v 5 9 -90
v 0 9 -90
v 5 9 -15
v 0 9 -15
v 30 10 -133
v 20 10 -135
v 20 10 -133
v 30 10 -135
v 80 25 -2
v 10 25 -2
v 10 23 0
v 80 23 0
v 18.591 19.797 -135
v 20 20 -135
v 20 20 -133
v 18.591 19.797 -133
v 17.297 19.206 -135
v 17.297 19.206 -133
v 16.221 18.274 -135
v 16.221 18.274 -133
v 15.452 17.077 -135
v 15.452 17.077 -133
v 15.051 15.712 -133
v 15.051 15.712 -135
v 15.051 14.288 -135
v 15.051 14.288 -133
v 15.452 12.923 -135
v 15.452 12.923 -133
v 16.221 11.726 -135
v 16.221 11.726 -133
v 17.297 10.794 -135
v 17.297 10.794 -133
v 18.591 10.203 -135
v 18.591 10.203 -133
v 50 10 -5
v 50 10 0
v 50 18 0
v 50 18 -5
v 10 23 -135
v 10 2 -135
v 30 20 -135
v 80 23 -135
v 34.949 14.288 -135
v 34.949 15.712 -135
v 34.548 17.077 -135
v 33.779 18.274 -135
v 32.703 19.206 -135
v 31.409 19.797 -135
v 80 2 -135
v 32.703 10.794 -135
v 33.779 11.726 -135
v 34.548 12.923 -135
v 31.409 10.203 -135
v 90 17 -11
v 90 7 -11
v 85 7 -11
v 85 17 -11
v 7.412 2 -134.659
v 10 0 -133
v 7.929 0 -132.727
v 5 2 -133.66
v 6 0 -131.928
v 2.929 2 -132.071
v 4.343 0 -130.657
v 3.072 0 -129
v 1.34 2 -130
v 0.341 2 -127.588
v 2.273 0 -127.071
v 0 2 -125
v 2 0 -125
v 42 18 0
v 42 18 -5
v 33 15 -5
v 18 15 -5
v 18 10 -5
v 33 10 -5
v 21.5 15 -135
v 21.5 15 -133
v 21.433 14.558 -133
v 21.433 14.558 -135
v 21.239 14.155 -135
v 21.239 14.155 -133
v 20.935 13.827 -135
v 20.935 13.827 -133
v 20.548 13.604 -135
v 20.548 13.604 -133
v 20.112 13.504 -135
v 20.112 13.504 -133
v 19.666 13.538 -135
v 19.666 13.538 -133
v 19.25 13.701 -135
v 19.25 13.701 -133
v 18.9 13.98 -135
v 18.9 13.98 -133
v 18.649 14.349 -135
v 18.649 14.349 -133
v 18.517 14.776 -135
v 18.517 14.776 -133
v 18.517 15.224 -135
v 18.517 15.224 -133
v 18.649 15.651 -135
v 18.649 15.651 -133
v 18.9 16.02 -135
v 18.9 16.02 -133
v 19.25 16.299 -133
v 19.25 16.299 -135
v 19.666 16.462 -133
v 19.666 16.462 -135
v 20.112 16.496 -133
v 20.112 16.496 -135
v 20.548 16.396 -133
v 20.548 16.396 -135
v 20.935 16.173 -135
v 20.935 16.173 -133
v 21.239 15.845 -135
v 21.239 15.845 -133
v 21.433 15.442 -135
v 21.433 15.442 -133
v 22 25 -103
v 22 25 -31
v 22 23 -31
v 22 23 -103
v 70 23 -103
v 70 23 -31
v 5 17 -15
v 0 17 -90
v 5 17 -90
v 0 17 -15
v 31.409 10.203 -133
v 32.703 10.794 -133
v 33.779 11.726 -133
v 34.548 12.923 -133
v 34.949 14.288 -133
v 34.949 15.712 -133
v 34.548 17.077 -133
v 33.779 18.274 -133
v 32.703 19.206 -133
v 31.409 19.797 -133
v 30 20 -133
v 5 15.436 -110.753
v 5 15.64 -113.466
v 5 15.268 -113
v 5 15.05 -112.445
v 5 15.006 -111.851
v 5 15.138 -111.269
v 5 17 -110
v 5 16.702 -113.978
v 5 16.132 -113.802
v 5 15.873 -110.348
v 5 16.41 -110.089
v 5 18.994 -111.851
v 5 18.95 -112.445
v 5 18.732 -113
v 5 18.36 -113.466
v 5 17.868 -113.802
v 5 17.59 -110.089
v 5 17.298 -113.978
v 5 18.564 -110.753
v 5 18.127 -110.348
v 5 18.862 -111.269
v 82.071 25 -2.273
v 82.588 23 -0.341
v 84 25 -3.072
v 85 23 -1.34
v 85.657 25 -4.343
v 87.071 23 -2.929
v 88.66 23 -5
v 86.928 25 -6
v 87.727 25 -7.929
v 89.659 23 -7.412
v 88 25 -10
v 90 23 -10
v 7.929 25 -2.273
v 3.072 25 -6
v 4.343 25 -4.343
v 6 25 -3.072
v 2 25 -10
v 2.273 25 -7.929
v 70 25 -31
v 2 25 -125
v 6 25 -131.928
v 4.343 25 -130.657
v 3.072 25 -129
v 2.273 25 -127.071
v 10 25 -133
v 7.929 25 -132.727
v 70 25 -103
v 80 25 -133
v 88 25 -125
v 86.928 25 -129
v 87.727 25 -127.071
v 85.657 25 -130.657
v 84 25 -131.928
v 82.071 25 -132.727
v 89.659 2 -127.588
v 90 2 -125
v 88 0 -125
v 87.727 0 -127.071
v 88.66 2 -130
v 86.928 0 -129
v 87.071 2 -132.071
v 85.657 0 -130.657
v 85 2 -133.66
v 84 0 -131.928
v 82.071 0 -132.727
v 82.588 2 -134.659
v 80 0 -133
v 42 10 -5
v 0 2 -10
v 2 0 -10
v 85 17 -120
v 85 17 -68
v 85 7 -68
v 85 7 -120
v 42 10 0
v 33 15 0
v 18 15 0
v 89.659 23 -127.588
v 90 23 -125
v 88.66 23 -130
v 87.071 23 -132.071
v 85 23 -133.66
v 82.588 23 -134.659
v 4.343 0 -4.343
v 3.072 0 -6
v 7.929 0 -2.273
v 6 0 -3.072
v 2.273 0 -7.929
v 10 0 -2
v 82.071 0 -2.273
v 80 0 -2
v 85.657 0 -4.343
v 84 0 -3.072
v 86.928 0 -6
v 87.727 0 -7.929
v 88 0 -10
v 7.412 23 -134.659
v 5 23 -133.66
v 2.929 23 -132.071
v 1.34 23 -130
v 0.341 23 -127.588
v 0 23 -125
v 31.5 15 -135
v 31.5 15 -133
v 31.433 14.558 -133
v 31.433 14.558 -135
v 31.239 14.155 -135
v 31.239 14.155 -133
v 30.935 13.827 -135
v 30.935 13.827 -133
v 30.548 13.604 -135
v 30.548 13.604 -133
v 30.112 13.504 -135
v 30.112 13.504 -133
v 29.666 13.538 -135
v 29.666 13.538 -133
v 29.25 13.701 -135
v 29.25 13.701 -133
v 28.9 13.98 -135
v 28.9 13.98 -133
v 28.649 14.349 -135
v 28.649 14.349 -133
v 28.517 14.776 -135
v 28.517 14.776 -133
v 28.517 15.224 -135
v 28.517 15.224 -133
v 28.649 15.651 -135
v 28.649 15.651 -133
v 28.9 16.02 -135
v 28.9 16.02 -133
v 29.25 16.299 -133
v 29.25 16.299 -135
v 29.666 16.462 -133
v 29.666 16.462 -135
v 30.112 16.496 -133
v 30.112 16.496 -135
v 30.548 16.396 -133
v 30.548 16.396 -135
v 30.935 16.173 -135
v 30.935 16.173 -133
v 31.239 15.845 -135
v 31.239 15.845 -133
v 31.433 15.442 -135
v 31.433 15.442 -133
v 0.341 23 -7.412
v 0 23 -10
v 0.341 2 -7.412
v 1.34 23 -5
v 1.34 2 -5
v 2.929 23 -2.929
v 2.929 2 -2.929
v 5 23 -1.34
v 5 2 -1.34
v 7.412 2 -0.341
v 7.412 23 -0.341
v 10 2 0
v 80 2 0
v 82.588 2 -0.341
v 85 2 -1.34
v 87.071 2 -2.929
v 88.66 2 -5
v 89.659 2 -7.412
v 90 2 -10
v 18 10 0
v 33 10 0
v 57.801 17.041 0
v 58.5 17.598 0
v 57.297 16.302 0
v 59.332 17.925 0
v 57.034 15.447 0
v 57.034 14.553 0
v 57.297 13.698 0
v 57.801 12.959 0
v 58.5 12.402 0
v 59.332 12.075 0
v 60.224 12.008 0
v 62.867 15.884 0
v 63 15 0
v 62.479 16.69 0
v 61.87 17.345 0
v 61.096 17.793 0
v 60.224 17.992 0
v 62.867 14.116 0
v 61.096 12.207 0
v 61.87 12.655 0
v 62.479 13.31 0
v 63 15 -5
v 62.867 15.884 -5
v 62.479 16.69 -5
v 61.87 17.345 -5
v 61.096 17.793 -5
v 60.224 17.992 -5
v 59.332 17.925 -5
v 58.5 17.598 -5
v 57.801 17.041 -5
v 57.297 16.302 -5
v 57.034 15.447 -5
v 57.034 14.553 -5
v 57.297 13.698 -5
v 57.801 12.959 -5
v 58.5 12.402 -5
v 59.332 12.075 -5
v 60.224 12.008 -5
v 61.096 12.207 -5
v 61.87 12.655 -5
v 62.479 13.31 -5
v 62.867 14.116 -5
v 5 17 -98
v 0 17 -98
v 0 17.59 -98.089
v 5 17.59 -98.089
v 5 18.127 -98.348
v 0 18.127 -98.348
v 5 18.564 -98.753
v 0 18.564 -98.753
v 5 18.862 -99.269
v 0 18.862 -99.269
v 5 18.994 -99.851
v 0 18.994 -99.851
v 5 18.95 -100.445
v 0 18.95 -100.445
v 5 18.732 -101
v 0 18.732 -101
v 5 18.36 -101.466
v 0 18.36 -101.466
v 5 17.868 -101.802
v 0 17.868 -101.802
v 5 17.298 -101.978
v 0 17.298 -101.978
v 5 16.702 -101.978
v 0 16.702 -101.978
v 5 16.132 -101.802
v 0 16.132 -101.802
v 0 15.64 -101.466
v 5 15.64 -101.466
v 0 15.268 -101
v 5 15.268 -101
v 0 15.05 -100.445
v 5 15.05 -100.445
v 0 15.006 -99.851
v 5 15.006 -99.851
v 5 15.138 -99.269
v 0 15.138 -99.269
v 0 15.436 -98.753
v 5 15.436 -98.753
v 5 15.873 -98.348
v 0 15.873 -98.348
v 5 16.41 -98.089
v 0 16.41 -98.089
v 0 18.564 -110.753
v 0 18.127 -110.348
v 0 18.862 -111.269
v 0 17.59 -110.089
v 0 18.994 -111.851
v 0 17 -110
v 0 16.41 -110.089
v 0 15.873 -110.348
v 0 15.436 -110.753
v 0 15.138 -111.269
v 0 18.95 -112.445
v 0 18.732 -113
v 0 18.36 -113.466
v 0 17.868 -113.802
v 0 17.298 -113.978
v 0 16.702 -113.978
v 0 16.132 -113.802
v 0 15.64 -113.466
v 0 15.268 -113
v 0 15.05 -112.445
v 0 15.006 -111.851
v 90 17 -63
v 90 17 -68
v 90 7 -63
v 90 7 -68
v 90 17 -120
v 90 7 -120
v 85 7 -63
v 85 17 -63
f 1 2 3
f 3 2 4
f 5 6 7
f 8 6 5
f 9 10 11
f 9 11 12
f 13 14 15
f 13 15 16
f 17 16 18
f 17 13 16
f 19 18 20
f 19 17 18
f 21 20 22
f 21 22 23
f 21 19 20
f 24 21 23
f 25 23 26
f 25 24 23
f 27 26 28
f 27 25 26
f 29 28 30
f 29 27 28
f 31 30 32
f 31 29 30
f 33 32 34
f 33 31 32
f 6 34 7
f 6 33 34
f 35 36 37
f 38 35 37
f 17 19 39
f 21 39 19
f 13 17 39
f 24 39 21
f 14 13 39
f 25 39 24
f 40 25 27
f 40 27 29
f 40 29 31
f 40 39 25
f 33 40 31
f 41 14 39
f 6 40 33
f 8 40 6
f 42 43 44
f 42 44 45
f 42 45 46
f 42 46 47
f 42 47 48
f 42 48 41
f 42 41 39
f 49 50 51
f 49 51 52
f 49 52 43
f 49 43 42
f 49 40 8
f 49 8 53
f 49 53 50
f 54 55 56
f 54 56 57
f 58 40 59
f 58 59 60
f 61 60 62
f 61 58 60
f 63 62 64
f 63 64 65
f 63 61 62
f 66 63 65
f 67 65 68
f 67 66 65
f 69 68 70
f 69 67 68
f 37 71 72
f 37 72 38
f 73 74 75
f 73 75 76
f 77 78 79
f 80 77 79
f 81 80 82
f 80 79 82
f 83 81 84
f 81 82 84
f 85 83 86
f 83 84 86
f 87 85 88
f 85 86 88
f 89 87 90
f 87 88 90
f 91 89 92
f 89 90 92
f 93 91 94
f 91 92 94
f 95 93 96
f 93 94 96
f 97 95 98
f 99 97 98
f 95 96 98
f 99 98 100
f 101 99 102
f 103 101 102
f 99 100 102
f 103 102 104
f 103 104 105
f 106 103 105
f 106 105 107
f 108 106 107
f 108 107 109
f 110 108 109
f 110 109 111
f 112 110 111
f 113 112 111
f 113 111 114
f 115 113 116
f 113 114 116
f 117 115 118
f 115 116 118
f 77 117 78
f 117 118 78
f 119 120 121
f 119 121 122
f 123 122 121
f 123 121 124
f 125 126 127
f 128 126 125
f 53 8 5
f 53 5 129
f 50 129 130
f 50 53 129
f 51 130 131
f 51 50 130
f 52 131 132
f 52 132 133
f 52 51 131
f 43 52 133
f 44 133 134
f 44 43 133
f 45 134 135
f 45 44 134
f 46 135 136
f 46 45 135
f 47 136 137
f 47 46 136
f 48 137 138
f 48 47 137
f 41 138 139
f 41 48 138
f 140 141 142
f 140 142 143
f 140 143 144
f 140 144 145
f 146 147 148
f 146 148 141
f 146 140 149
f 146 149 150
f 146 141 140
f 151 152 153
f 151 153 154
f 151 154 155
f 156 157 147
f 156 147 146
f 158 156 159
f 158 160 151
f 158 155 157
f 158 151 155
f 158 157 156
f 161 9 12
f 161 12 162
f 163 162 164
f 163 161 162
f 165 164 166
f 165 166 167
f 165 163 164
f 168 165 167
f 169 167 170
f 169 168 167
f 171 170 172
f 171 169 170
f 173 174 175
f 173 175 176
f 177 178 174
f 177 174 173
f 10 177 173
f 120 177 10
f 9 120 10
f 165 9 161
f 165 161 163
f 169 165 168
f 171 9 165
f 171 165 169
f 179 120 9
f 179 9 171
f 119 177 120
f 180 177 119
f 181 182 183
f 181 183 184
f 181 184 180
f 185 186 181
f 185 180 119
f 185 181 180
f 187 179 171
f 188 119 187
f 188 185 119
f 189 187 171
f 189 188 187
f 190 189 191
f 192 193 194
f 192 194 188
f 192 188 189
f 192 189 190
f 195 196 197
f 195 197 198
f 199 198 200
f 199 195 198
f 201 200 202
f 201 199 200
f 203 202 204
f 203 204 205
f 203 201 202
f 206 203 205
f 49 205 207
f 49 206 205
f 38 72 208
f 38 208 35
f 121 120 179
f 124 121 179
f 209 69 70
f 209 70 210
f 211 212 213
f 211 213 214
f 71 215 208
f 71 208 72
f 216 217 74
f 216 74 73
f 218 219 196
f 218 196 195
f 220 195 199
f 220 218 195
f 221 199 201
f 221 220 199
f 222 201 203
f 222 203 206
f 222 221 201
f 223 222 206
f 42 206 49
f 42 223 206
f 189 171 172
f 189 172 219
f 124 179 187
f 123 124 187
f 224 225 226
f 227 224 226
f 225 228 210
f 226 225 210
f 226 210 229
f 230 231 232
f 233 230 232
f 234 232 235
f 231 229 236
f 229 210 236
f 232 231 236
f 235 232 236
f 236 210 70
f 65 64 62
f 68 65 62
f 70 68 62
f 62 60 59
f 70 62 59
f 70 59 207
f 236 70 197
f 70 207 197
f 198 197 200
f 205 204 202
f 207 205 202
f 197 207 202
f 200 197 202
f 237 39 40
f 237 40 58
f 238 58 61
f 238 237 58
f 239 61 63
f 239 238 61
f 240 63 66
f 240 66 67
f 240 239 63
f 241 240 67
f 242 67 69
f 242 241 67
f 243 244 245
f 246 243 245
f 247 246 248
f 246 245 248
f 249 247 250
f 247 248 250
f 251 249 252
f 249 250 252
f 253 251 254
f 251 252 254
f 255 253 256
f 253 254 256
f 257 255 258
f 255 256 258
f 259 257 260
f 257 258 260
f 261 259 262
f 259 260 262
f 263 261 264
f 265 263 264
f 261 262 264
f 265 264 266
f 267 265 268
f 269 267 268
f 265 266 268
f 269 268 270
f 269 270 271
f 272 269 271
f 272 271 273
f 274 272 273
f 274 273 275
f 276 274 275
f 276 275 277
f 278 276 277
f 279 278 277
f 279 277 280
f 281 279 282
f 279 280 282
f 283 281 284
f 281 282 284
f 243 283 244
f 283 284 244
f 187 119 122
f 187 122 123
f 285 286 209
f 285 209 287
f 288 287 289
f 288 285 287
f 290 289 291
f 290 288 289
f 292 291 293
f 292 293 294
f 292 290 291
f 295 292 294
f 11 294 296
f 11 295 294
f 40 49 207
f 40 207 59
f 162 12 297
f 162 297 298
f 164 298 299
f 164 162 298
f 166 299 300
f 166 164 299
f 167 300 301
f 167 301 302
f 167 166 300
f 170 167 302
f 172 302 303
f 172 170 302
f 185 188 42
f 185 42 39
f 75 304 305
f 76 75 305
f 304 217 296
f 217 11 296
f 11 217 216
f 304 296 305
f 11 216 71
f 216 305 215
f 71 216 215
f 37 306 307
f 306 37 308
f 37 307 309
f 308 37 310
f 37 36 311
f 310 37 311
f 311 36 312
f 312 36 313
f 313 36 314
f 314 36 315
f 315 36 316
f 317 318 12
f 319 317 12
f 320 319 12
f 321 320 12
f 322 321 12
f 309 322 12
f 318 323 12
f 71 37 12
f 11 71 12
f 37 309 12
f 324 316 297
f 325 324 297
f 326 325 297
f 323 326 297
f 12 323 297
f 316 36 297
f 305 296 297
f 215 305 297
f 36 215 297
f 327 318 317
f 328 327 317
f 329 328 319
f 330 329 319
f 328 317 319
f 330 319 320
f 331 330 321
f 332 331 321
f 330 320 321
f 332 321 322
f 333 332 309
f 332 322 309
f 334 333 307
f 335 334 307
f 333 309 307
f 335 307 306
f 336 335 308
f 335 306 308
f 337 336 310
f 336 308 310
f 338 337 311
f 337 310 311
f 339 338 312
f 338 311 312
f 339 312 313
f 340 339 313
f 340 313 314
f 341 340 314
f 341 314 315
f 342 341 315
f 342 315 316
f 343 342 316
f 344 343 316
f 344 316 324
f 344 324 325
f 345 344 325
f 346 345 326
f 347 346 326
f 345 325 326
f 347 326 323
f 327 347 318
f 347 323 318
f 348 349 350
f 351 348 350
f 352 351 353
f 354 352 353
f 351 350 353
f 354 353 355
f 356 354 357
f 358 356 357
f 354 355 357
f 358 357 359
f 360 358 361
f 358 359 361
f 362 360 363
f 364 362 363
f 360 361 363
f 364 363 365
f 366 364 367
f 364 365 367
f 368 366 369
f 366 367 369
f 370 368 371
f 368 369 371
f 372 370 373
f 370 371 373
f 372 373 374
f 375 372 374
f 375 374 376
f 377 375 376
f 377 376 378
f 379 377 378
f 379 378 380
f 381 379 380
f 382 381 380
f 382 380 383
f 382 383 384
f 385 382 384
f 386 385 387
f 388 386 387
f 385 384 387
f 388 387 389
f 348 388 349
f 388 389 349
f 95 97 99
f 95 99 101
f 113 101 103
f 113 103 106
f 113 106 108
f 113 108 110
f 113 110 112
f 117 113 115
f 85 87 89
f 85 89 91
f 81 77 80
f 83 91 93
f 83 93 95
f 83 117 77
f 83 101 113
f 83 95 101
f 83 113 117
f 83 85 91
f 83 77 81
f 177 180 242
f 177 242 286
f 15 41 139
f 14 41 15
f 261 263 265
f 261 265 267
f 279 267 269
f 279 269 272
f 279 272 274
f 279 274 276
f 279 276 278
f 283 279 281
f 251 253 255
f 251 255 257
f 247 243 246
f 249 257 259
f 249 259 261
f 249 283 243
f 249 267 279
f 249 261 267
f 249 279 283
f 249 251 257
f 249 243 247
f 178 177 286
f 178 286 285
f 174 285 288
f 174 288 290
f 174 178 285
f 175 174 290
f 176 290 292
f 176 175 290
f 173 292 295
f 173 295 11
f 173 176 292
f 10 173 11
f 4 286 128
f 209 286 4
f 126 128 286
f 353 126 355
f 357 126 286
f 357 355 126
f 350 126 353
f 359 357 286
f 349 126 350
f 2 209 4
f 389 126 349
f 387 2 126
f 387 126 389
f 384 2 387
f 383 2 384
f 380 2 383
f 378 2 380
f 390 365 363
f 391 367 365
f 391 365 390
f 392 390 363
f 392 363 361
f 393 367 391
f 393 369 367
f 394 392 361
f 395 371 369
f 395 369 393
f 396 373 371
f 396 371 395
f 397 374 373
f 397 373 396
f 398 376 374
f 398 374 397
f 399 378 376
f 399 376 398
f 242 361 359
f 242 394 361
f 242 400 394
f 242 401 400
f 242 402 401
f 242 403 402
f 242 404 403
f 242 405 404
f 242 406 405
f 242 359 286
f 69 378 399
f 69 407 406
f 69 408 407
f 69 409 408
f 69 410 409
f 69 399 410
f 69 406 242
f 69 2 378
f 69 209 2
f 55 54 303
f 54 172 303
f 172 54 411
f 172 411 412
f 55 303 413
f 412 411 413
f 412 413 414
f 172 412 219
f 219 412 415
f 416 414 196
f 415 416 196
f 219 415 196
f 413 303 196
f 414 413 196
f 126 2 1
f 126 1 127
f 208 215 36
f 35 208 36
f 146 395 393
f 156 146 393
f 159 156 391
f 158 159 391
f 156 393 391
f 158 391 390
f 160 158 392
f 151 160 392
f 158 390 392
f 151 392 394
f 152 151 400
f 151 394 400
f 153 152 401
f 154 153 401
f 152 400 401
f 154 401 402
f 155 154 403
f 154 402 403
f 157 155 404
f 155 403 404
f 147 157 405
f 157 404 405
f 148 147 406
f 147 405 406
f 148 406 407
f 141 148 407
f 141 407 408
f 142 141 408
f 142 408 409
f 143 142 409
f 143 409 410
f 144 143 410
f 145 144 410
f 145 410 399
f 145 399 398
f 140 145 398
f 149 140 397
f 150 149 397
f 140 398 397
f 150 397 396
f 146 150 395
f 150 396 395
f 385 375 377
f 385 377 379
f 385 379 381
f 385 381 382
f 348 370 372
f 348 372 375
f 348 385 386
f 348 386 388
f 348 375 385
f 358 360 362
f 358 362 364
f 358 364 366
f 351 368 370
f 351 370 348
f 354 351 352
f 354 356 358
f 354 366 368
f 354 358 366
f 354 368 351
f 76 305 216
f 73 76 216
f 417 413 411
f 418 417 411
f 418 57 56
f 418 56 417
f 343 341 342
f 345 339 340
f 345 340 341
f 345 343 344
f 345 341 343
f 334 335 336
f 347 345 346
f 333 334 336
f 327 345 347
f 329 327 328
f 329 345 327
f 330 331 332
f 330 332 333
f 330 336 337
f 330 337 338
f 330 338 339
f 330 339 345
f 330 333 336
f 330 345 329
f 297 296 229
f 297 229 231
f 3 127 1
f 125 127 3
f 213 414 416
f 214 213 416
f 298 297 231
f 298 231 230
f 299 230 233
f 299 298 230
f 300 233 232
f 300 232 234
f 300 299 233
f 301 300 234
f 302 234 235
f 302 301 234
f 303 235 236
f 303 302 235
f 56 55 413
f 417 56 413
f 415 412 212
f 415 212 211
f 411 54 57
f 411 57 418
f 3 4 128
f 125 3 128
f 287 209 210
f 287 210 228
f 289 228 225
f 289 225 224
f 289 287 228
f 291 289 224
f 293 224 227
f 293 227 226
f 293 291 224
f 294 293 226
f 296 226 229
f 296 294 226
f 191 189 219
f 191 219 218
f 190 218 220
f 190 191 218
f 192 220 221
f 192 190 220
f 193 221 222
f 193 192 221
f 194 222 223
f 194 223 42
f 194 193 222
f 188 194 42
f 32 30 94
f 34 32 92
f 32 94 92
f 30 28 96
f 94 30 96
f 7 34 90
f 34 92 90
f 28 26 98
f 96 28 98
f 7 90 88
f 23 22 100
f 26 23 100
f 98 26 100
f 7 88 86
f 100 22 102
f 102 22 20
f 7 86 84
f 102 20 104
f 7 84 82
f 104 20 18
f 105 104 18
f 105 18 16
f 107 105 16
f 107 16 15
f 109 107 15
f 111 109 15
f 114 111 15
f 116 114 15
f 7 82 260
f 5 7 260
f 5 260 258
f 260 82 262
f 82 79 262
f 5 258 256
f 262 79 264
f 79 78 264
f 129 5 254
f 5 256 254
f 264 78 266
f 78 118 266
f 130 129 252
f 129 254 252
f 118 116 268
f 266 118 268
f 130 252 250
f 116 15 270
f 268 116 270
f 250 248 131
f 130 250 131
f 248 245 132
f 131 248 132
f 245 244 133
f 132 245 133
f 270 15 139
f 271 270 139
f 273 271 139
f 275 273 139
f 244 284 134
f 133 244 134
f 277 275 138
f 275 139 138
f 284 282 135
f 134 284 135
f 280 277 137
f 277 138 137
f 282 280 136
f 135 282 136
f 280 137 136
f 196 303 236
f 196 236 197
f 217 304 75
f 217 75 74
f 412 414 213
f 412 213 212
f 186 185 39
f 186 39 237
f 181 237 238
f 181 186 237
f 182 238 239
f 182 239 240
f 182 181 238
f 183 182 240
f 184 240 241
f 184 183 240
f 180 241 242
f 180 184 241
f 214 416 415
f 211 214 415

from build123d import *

# Parameters (mm, degrees)
ESQUISSE1_W             = 90
ESQUISSE1_H             = 135
BOSS_EXTRU_1_DEPTH      = 25
CONG_1_R                = 10
CONG_2_R                = 10
CONG_3_R                = 10
CONG_4_R                = 10
CHANFREIN1_SIZE         = 2
CHANFREIN2_SIZE         = 2
ESQUISSE2_R             = 3
ESQUISSE2_W             = 8
ESQUISSE2_H             = 8
ESQUISSE2_W_2           = 15
ESQUISSE2_H_2           = 5
ENL_V_MAT_EXTRU_1_DEPTH = 5
ESQUISSE3_R             = 2
ESQUISSE3_W             = 75
ESQUISSE3_H             = 8
ENL_V_MAT_EXTRU_2_DEPTH = 5
ESQUISSE4_W             = 48
ESQUISSE4_H             = 72
ENL_V_MAT_EXTRU_3_DEPTH = 2
ENL_V_MAT_EXTRU_4_DEPTH = 2
ESQUISSE6_R             = 1.5
BOSS_EXTRU_2_DEPTH      = 2
ESQUISSE7_W             = 52
ESQUISSE7_H             = 10
ENL_V_MAT_EXTRU_5_DEPTH = 5


with BuildPart() as part:
    # Esquisse1 → Boss.-Extru.1 (new body)
    with BuildSketch(Plane(origin=(0, 0, 0), x_dir=(1, 0, 0), z_dir=(0, 1, 0))):
        with Locations((45, 67.5)):
            Rectangle(ESQUISSE1_W, ESQUISSE1_H)
    extrude(amount=BOSS_EXTRU_1_DEPTH)

    # Congé1
    cong_1_edges = [part.edges().sort_by_distance(p)[0] for p in [
        (90, 12.5, 0),
    ]]
    fillet(cong_1_edges, radius=CONG_1_R)

    # Congé2
    cong_2_edges = [part.edges().sort_by_distance(p)[0] for p in [
        (90, 12.5, -135),
    ]]
    fillet(cong_2_edges, radius=CONG_2_R)

    # Congé3
    cong_3_edges = [part.edges().sort_by_distance(p)[0] for p in [
        (0, 12.5, -135),
    ]]
    fillet(cong_3_edges, radius=CONG_3_R)

    # Congé4
    cong_4_edges = [part.edges().sort_by_distance(p)[0] for p in [
        (0, 12.5, 0),
    ]]
    fillet(cong_4_edges, radius=CONG_4_R)

    # Chanfrein1
    chanfrein1_edges = [part.edges().sort_by_distance(p)[0] for p in [
        (90, 25, -67.5),
        (87.071067812, 25, -2.928932188),
        (87.071067812, 25, -132.071067812),
        (45, 25, -135),
        (2.928932188, 25, -132.071067812),
        (45, 25, 0),
        (0, 25, -67.5),
        (2.928932188, 25, -2.928932188),
    ]]
    chamfer(chanfrein1_edges, length=CHANFREIN1_SIZE)

    # Chanfrein2
    chanfrein2_edges = [part.edges().sort_by_distance(p)[0] for p in [
        (90, 0, -67.5),
        (87.071067812, 0, -2.928932188),
        (87.071067812, 0, -132.071067812),
        (45, 0, -135),
        (2.928932188, 0, -132.071067812),
        (45, 0, 0),
        (0, 0, -67.5),
        (2.928932188, 0, -2.928932188),
    ]]
    chamfer(chanfrein2_edges, length=CHANFREIN2_SIZE)

    # Esquisse2 → Enlèv. mat.-Extru.1 (cut)
    with BuildSketch(Plane.XY):
        with Locations((60, 15)):
            Circle(ESQUISSE2_R)
        with Locations((46, 14)):
            Rectangle(ESQUISSE2_W, ESQUISSE2_H)
        with Locations((25.5, 12.5)):
            Rectangle(ESQUISSE2_W_2, ESQUISSE2_H_2)
    extrude(amount=-ENL_V_MAT_EXTRU_1_DEPTH, mode=Mode.SUBTRACT)

    # Esquisse3 → Enlèv. mat.-Extru.2 (cut)
    with BuildSketch(Plane.ZY):
        with Locations((-112, 17)):
            Circle(ESQUISSE3_R)
        with Locations((-100, 17)):
            Circle(ESQUISSE3_R)
        with Locations((-52.5, 13)):
            Rectangle(ESQUISSE3_W, ESQUISSE3_H)
    extrude(amount=-ENL_V_MAT_EXTRU_2_DEPTH, mode=Mode.SUBTRACT)

    # Esquisse4 → Enlèv. mat.-Extru.3 (cut)
    with BuildSketch(Plane(origin=(0, 25, 0), x_dir=(1, 0, 0), z_dir=(0, 1, 0))):
        with Locations((46, 67)):
            Rectangle(ESQUISSE4_W, ESQUISSE4_H)
    extrude(amount=-ENL_V_MAT_EXTRU_3_DEPTH, mode=Mode.SUBTRACT)

    # Esquisse5 → Enlèv. mat.-Extru.4 (cut)
    with BuildSketch(Plane(origin=(0, 0, -135), x_dir=(-1, 0, 0), z_dir=(0, 0, -1))):
        with BuildLine():
            Line((-30, 20), (-20, 20))
            ThreePointArc((-20, 20), (-15, 15), (-20, 10))
            Line((-20, 10), (-30, 10))
            ThreePointArc((-30, 10), (-35, 15), (-30, 20))
        make_face()
    extrude(amount=-ENL_V_MAT_EXTRU_4_DEPTH, mode=Mode.SUBTRACT)

    # Esquisse6 → Boss.-Extru.2 (add)
    with BuildSketch(Plane(origin=(0, 0, -133), x_dir=(-1, 0, 0), z_dir=(0, 0, -1))):
        with Locations(Location((-30, 15, 0), (0, 0, 180))):
            Circle(ESQUISSE6_R)
        with Locations(Location((-20, 15, 0), (0, 0, 180))):
            Circle(ESQUISSE6_R)
    extrude(amount=BOSS_EXTRU_2_DEPTH)

    # Esquisse7 → Enlèv. mat.-Extru.5 (cut)
    with BuildSketch(Plane(origin=(90, 0, 0), x_dir=(0, 0, -1), z_dir=(1, 0, 0))):
        with Locations((37, 12)):
            Rectangle(ESQUISSE7_W, ESQUISSE7_H)
        with Locations((94, 12)):
            Rectangle(ESQUISSE7_W, ESQUISSE7_H)
    extrude(amount=-ENL_V_MAT_EXTRU_5_DEPTH, mode=Mode.SUBTRACT)


solid = part.part
